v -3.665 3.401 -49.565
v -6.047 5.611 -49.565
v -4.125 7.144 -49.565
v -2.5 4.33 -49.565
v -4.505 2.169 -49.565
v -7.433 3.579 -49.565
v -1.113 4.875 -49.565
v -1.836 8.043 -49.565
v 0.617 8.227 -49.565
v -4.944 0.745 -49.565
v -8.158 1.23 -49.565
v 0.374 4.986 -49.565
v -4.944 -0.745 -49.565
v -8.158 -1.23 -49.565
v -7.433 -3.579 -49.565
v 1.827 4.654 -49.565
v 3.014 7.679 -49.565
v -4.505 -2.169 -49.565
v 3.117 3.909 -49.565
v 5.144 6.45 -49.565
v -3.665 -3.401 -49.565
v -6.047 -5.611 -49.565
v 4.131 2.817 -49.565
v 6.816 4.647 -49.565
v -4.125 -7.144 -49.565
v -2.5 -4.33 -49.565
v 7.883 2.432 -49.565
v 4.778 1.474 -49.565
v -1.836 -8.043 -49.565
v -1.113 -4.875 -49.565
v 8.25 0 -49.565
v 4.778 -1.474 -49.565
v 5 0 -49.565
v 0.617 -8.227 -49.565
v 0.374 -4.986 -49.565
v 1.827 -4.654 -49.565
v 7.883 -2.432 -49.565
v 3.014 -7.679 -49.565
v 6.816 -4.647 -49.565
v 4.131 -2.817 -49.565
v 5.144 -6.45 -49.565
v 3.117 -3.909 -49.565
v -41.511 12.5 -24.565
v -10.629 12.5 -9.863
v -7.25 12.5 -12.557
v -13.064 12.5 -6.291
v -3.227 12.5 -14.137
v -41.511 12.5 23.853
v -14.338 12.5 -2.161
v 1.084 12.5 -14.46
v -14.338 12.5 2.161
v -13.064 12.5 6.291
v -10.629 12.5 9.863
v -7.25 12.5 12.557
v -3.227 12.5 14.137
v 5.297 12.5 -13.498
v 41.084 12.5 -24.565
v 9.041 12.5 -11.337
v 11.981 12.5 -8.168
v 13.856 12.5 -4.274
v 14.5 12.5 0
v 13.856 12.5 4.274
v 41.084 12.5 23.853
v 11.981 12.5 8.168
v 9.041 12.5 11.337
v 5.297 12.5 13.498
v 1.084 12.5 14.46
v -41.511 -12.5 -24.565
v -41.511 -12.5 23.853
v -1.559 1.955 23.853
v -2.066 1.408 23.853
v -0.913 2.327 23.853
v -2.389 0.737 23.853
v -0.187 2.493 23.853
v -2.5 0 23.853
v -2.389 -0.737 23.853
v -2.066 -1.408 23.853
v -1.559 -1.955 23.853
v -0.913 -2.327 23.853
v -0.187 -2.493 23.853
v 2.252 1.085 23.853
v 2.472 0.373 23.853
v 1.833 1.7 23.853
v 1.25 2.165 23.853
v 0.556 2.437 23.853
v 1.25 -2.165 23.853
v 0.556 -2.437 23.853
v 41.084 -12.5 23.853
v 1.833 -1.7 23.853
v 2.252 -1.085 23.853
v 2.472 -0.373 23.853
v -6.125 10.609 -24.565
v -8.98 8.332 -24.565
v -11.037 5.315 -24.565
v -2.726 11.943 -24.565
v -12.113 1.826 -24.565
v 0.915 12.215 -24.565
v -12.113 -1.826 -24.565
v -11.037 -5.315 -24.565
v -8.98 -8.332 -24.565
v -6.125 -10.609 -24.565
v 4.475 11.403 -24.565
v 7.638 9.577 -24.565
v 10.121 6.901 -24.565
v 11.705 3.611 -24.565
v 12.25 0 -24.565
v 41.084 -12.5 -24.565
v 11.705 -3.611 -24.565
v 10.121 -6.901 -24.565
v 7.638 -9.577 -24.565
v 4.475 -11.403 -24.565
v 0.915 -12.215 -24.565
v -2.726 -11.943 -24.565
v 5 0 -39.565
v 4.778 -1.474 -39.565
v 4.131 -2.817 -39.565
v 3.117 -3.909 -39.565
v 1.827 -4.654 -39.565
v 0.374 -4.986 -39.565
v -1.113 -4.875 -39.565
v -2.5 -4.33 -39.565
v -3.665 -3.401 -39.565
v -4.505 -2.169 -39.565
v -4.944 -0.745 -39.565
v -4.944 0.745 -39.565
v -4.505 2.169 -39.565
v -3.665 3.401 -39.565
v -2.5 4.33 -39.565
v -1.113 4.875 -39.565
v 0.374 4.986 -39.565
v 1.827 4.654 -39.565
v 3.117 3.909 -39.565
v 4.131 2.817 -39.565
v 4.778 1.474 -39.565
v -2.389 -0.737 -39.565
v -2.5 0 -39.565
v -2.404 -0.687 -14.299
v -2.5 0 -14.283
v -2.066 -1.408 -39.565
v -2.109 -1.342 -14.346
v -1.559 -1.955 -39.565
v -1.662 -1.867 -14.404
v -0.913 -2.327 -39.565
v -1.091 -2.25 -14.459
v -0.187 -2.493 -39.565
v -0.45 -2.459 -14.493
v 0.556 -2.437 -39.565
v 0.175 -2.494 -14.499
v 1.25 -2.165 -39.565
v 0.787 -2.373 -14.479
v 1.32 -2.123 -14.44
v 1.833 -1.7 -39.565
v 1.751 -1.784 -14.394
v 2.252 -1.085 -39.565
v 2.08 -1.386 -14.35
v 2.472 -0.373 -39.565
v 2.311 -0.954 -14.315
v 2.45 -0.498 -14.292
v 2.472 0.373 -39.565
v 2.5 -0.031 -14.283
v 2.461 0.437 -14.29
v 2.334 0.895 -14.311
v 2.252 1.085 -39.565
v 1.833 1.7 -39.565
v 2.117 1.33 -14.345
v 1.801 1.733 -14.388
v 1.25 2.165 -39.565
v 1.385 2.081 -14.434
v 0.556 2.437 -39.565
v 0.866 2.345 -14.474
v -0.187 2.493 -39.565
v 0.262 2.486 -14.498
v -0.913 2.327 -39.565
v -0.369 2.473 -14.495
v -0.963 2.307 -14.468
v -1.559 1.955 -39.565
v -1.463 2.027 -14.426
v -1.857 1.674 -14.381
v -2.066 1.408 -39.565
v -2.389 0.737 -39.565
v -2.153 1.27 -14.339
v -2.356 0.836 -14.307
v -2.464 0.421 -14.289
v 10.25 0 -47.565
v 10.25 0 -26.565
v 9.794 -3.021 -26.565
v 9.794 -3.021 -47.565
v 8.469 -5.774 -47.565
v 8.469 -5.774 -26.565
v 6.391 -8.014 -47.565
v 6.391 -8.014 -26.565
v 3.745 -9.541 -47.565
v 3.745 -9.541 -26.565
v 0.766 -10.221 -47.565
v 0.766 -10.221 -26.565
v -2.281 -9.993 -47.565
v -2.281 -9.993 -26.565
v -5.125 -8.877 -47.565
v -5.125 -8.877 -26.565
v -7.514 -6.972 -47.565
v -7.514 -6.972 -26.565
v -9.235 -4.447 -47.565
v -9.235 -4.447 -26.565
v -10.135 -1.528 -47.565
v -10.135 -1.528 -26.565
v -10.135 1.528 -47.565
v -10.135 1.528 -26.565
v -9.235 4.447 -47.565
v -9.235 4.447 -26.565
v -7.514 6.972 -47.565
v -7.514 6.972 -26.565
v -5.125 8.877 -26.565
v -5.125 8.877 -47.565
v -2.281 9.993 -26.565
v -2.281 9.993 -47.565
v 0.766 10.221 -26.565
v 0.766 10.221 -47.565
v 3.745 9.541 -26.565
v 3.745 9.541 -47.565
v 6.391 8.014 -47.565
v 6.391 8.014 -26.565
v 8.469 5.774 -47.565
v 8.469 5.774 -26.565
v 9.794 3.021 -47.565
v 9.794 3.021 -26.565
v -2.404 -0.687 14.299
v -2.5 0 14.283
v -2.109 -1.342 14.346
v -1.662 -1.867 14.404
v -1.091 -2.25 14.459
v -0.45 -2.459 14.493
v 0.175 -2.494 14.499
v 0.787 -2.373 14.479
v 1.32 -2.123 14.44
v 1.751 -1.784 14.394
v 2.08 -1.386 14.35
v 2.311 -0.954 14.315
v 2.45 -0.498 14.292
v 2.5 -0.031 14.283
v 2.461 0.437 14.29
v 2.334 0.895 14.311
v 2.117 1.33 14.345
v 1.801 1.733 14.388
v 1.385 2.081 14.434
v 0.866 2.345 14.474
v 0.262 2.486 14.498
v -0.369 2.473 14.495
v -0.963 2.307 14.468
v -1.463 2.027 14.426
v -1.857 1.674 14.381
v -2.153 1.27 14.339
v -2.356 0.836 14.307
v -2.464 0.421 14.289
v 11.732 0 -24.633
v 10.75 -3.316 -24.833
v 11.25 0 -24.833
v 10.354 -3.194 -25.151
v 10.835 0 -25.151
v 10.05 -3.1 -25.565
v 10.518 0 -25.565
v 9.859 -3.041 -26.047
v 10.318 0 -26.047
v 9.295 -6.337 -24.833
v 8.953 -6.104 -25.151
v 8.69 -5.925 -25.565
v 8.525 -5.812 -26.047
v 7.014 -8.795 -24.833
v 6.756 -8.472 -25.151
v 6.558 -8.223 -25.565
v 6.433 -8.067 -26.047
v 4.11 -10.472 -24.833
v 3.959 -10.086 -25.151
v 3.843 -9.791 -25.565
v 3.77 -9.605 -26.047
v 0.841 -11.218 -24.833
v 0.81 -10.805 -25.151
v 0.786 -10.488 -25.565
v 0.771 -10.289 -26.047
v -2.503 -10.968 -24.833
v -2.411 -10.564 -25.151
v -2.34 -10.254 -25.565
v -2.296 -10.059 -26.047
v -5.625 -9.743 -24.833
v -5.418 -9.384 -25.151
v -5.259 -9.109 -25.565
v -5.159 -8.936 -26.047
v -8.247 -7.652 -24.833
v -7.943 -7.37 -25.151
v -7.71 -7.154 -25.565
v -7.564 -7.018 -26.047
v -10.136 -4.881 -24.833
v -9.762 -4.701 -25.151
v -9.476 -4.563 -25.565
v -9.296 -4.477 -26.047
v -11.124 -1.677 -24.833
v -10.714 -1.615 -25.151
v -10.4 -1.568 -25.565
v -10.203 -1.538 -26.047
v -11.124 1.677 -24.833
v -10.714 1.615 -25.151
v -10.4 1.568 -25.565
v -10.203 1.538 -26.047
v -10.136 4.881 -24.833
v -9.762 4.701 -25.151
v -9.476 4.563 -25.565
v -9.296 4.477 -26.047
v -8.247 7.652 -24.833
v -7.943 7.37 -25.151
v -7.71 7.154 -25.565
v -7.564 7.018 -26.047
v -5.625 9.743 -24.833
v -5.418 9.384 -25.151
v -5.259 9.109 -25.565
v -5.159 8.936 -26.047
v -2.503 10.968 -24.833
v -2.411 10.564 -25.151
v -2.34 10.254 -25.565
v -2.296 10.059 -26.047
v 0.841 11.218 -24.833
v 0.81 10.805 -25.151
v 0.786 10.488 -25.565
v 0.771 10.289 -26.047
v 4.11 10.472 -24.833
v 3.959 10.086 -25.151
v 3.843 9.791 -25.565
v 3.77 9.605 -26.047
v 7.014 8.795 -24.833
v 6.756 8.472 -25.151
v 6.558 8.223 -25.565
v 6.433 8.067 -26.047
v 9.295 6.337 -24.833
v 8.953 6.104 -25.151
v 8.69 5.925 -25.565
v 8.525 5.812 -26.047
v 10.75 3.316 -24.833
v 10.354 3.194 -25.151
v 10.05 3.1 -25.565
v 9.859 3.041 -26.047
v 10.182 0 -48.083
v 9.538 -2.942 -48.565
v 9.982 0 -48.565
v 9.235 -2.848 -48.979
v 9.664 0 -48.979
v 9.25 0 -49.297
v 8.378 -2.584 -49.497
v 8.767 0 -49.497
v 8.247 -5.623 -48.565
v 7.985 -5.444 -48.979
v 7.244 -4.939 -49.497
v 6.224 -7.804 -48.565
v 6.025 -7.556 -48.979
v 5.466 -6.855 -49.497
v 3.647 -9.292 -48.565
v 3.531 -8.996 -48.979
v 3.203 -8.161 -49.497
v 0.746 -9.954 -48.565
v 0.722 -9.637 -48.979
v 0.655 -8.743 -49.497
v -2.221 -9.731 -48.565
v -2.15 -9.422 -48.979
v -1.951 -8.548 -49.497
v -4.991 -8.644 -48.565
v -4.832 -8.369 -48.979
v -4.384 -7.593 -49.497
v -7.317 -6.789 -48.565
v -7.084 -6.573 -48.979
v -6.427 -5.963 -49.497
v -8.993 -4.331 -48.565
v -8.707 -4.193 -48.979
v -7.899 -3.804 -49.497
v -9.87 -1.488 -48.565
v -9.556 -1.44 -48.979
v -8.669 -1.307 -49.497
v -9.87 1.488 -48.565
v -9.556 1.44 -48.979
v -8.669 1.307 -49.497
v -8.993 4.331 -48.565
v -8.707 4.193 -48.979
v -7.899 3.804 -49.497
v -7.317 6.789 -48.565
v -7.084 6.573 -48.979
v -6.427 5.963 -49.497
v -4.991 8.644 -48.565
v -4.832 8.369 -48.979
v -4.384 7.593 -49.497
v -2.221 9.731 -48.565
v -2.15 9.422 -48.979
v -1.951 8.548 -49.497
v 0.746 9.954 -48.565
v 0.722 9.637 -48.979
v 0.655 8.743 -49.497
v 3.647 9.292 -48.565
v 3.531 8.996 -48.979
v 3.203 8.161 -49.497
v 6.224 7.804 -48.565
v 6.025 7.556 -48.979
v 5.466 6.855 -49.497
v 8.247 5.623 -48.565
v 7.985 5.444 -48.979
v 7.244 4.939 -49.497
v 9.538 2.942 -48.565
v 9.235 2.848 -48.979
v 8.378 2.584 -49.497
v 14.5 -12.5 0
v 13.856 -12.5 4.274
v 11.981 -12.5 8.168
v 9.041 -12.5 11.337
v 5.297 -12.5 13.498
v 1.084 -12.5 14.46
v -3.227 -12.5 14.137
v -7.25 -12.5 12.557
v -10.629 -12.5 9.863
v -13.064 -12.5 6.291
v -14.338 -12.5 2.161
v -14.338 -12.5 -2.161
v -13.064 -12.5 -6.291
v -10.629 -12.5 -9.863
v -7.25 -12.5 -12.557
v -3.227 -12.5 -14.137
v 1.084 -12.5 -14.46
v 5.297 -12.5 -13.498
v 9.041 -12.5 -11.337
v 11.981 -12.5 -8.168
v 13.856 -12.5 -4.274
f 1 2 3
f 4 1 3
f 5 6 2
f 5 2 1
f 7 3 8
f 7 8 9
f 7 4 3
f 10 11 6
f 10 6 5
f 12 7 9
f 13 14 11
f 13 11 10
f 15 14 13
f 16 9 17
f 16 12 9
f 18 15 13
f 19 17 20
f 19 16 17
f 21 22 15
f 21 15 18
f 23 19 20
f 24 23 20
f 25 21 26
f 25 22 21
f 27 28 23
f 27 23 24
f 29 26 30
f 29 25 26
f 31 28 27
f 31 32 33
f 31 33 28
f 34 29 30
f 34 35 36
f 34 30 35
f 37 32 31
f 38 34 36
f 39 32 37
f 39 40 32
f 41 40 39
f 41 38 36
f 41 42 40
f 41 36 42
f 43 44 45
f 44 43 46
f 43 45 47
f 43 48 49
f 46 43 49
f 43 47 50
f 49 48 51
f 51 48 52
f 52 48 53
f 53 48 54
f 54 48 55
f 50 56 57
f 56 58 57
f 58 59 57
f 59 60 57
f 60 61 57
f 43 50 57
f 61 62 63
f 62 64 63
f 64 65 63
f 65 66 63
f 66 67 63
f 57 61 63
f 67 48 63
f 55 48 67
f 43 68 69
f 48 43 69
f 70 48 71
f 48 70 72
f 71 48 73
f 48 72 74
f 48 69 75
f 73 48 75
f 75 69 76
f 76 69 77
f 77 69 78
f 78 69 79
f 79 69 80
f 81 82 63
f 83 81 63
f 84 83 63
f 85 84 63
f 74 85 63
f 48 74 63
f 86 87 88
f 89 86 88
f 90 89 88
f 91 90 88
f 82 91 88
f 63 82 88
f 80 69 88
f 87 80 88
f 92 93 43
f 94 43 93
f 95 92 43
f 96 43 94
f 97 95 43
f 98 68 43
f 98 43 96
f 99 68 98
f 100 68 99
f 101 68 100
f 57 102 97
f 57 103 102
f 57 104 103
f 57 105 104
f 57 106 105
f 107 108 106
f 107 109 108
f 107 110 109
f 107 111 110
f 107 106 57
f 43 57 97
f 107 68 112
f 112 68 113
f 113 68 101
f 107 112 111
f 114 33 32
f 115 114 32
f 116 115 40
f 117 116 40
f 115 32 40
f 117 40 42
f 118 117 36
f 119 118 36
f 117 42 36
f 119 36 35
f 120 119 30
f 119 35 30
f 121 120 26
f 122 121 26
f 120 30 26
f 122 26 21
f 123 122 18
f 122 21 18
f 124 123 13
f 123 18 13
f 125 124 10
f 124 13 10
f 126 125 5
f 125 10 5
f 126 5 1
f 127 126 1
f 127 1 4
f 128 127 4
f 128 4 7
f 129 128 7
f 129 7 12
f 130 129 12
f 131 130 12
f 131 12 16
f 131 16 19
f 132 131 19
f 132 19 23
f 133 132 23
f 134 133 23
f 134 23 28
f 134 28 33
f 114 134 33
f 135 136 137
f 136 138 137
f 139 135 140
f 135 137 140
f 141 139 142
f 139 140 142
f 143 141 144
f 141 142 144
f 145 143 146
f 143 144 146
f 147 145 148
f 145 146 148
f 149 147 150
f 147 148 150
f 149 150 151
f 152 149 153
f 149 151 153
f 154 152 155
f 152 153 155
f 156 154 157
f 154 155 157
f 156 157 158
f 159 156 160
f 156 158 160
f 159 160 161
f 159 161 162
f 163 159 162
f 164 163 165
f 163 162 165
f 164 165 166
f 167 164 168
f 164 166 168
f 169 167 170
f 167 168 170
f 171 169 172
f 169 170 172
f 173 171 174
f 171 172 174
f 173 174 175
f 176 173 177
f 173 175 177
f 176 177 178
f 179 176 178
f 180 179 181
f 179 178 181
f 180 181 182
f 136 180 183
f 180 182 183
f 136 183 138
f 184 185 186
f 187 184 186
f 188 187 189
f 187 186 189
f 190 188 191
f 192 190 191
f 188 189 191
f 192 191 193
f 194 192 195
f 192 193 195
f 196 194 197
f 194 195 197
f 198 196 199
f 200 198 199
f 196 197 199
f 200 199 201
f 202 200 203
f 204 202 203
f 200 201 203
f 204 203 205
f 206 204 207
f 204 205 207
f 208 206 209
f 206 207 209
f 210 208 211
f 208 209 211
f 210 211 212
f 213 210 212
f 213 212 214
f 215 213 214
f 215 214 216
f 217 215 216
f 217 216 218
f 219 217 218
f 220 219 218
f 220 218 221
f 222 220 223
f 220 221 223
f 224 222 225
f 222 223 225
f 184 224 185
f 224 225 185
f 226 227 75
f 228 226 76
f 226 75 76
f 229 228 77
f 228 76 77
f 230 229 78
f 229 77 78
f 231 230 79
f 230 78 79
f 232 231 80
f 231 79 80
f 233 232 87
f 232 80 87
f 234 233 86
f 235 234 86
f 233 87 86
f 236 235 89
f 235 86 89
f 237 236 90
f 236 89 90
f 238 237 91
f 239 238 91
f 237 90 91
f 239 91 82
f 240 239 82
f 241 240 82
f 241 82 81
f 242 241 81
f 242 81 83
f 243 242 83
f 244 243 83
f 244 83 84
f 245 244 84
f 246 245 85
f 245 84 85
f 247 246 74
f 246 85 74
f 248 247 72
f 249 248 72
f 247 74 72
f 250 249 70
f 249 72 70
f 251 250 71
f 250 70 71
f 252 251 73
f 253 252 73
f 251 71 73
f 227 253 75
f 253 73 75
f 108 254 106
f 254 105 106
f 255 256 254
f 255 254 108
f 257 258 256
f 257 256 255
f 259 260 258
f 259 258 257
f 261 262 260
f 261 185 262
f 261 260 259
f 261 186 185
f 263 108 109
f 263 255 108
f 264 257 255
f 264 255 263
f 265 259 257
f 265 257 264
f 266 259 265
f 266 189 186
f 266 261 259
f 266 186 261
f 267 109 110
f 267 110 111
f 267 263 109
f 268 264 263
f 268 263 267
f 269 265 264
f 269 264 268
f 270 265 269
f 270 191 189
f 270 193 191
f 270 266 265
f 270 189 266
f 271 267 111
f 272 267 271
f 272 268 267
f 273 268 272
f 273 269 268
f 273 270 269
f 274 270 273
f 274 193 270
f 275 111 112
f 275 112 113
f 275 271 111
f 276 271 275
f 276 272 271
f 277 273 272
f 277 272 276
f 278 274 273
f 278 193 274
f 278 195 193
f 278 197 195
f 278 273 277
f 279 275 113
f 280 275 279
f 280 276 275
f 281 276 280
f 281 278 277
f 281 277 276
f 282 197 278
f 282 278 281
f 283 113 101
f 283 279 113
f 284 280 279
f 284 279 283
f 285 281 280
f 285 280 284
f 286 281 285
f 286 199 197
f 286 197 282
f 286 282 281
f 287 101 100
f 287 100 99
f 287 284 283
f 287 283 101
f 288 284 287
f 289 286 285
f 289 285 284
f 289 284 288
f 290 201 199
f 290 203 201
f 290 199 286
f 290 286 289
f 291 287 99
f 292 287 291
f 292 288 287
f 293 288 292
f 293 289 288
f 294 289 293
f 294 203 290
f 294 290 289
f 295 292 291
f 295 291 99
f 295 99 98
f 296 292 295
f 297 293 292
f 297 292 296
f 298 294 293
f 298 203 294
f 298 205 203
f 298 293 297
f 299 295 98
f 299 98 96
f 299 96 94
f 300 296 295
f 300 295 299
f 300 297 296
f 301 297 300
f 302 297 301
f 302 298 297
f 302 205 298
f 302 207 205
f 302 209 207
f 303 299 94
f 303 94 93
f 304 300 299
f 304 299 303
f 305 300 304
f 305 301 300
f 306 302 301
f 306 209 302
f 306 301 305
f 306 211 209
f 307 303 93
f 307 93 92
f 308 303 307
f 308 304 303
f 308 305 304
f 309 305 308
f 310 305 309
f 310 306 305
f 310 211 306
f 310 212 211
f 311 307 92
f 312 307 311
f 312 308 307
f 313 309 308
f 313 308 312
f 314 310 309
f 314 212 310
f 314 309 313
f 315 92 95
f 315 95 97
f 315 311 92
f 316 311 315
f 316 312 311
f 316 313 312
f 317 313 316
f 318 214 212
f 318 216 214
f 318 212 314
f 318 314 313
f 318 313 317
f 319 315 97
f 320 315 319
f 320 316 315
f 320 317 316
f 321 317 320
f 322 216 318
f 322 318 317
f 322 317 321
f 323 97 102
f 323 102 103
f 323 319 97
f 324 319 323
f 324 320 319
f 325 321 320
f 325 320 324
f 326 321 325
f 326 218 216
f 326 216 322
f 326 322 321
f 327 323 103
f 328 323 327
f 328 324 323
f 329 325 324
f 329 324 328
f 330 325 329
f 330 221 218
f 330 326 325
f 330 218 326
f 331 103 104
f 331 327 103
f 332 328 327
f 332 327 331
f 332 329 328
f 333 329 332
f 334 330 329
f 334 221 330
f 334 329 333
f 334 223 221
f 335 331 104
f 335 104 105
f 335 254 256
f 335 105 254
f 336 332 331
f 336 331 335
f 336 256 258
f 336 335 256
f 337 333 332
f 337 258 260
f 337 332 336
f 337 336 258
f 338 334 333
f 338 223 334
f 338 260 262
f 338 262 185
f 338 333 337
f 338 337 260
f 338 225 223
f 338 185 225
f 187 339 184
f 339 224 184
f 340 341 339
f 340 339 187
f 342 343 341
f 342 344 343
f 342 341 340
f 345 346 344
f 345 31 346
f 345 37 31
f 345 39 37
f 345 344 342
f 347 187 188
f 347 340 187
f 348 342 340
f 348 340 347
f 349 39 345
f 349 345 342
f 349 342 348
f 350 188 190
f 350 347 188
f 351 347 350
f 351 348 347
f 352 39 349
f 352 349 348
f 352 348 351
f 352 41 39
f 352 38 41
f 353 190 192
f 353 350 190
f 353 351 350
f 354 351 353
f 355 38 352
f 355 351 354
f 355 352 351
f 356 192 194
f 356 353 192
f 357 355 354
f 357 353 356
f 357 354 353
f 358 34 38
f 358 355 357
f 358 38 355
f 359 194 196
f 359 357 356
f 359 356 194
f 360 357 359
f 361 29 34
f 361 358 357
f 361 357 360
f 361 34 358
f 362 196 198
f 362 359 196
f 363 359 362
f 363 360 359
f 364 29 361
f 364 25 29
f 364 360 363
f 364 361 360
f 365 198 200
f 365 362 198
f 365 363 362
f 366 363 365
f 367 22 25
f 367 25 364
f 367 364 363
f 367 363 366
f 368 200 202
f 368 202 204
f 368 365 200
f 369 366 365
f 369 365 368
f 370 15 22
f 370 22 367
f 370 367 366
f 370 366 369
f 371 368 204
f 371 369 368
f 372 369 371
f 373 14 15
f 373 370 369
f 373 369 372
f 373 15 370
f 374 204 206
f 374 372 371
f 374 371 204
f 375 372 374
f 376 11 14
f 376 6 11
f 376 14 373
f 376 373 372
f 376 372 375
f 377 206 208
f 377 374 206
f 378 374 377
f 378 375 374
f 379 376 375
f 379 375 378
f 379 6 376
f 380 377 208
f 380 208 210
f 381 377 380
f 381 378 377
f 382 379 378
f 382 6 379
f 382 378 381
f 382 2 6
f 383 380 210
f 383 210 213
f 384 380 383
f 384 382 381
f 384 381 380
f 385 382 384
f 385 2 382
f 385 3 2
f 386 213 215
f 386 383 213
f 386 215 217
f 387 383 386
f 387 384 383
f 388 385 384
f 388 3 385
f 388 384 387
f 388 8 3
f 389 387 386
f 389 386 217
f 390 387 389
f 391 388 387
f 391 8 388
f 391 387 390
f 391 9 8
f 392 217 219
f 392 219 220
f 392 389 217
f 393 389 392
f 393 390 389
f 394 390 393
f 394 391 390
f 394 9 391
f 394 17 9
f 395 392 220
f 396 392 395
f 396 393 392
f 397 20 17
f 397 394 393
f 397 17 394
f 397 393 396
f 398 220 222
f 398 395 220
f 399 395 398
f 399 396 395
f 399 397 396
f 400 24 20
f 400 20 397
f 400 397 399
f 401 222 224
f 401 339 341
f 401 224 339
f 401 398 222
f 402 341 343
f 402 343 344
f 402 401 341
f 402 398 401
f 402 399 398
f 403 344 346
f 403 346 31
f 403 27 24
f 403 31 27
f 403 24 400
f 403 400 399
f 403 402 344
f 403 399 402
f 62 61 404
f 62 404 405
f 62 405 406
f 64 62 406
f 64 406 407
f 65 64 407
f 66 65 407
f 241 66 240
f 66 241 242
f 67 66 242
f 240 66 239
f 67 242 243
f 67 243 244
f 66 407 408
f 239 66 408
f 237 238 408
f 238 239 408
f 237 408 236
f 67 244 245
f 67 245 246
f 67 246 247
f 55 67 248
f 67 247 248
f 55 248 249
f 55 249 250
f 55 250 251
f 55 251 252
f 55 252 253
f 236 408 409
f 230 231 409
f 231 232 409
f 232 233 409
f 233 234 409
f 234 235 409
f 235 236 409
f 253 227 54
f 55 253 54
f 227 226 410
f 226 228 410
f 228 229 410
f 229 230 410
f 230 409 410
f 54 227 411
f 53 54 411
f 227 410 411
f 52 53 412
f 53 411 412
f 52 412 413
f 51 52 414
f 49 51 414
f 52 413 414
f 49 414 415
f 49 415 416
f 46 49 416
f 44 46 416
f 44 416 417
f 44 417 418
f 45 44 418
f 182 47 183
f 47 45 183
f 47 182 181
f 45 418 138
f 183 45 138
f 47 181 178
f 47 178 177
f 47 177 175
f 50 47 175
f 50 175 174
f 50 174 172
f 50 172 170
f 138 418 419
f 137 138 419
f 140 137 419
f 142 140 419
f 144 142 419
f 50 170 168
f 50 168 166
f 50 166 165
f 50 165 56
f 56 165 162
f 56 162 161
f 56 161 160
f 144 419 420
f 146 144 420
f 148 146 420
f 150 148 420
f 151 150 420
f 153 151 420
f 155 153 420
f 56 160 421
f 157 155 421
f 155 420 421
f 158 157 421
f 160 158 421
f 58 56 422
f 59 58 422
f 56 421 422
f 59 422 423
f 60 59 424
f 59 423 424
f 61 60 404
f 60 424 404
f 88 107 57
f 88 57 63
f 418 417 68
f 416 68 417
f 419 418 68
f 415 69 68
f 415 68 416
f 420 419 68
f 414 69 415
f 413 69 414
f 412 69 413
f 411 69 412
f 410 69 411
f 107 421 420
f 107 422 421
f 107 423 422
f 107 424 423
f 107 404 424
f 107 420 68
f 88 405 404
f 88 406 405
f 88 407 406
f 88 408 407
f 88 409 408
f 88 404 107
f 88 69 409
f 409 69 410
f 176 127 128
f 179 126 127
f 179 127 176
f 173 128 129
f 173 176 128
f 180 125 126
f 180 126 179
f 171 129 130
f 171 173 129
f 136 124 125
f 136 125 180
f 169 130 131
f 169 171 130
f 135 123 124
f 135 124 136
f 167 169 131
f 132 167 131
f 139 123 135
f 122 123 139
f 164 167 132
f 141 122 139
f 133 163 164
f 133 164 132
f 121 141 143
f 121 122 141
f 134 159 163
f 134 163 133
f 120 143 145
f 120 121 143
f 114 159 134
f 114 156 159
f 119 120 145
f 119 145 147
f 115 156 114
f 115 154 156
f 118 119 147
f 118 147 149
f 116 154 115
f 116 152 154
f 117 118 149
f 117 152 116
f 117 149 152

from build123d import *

# Parameters (mm, degrees)
F0_W           = 82.594938
F0_H           = 48.417722
F1_DEPTH       = 12.5
F2_R           = 14.500066
F3_DEPTH       = 25.001
F4_R           = 10.249702
F5_DEPTH       = 25
F6_R           = 2
F8_D           = 5
F8_CBORE_D     = 10
F8_CBORE_DEPTH = 10


with BuildPart() as f1:
    # F0 (on Front) → F1 (new body, symmetric)
    with BuildSketch(Plane.XZ):
        with Locations((-0.213608, -0.356012)):
            Rectangle(F0_W, F0_H)
    extrude(amount=F1_DEPTH, both=True)

    # F2 (on face) → F3 (cut, through all)
    with BuildSketch(Plane.XZ.offset(12.5)):
        Circle(F2_R)
    extrude(amount=-F3_DEPTH, mode=Mode.SUBTRACT)

    # F4 (on face) → F5 (join)
    with BuildSketch(Plane(origin=(0, 0, -24.564873), x_dir=(1, 0, 0), z_dir=(0, 0, -1))):
        Circle(F4_R)
    extrude(amount=F5_DEPTH)

    # F6
    f6_edges = [f1.edges().sort_by_distance(p)[0] for p in [
        (-10.249702, 0, -49.564873),
        (10.249702, 0, -37.064873),
        (-10.249702, 0, -24.564873),
    ]]
    fillet(f6_edges, radius=F6_R)

    # F8 (through all)
    with Locations(Plane(origin=(0, 0, -49.564873), x_dir=(1, 0, 0), z_dir=(0, 0, -1))):
        with Locations((0, 0)):
            CounterBoreHole(F8_D / 2, F8_CBORE_D / 2, F8_CBORE_DEPTH)


solid = f1.part
